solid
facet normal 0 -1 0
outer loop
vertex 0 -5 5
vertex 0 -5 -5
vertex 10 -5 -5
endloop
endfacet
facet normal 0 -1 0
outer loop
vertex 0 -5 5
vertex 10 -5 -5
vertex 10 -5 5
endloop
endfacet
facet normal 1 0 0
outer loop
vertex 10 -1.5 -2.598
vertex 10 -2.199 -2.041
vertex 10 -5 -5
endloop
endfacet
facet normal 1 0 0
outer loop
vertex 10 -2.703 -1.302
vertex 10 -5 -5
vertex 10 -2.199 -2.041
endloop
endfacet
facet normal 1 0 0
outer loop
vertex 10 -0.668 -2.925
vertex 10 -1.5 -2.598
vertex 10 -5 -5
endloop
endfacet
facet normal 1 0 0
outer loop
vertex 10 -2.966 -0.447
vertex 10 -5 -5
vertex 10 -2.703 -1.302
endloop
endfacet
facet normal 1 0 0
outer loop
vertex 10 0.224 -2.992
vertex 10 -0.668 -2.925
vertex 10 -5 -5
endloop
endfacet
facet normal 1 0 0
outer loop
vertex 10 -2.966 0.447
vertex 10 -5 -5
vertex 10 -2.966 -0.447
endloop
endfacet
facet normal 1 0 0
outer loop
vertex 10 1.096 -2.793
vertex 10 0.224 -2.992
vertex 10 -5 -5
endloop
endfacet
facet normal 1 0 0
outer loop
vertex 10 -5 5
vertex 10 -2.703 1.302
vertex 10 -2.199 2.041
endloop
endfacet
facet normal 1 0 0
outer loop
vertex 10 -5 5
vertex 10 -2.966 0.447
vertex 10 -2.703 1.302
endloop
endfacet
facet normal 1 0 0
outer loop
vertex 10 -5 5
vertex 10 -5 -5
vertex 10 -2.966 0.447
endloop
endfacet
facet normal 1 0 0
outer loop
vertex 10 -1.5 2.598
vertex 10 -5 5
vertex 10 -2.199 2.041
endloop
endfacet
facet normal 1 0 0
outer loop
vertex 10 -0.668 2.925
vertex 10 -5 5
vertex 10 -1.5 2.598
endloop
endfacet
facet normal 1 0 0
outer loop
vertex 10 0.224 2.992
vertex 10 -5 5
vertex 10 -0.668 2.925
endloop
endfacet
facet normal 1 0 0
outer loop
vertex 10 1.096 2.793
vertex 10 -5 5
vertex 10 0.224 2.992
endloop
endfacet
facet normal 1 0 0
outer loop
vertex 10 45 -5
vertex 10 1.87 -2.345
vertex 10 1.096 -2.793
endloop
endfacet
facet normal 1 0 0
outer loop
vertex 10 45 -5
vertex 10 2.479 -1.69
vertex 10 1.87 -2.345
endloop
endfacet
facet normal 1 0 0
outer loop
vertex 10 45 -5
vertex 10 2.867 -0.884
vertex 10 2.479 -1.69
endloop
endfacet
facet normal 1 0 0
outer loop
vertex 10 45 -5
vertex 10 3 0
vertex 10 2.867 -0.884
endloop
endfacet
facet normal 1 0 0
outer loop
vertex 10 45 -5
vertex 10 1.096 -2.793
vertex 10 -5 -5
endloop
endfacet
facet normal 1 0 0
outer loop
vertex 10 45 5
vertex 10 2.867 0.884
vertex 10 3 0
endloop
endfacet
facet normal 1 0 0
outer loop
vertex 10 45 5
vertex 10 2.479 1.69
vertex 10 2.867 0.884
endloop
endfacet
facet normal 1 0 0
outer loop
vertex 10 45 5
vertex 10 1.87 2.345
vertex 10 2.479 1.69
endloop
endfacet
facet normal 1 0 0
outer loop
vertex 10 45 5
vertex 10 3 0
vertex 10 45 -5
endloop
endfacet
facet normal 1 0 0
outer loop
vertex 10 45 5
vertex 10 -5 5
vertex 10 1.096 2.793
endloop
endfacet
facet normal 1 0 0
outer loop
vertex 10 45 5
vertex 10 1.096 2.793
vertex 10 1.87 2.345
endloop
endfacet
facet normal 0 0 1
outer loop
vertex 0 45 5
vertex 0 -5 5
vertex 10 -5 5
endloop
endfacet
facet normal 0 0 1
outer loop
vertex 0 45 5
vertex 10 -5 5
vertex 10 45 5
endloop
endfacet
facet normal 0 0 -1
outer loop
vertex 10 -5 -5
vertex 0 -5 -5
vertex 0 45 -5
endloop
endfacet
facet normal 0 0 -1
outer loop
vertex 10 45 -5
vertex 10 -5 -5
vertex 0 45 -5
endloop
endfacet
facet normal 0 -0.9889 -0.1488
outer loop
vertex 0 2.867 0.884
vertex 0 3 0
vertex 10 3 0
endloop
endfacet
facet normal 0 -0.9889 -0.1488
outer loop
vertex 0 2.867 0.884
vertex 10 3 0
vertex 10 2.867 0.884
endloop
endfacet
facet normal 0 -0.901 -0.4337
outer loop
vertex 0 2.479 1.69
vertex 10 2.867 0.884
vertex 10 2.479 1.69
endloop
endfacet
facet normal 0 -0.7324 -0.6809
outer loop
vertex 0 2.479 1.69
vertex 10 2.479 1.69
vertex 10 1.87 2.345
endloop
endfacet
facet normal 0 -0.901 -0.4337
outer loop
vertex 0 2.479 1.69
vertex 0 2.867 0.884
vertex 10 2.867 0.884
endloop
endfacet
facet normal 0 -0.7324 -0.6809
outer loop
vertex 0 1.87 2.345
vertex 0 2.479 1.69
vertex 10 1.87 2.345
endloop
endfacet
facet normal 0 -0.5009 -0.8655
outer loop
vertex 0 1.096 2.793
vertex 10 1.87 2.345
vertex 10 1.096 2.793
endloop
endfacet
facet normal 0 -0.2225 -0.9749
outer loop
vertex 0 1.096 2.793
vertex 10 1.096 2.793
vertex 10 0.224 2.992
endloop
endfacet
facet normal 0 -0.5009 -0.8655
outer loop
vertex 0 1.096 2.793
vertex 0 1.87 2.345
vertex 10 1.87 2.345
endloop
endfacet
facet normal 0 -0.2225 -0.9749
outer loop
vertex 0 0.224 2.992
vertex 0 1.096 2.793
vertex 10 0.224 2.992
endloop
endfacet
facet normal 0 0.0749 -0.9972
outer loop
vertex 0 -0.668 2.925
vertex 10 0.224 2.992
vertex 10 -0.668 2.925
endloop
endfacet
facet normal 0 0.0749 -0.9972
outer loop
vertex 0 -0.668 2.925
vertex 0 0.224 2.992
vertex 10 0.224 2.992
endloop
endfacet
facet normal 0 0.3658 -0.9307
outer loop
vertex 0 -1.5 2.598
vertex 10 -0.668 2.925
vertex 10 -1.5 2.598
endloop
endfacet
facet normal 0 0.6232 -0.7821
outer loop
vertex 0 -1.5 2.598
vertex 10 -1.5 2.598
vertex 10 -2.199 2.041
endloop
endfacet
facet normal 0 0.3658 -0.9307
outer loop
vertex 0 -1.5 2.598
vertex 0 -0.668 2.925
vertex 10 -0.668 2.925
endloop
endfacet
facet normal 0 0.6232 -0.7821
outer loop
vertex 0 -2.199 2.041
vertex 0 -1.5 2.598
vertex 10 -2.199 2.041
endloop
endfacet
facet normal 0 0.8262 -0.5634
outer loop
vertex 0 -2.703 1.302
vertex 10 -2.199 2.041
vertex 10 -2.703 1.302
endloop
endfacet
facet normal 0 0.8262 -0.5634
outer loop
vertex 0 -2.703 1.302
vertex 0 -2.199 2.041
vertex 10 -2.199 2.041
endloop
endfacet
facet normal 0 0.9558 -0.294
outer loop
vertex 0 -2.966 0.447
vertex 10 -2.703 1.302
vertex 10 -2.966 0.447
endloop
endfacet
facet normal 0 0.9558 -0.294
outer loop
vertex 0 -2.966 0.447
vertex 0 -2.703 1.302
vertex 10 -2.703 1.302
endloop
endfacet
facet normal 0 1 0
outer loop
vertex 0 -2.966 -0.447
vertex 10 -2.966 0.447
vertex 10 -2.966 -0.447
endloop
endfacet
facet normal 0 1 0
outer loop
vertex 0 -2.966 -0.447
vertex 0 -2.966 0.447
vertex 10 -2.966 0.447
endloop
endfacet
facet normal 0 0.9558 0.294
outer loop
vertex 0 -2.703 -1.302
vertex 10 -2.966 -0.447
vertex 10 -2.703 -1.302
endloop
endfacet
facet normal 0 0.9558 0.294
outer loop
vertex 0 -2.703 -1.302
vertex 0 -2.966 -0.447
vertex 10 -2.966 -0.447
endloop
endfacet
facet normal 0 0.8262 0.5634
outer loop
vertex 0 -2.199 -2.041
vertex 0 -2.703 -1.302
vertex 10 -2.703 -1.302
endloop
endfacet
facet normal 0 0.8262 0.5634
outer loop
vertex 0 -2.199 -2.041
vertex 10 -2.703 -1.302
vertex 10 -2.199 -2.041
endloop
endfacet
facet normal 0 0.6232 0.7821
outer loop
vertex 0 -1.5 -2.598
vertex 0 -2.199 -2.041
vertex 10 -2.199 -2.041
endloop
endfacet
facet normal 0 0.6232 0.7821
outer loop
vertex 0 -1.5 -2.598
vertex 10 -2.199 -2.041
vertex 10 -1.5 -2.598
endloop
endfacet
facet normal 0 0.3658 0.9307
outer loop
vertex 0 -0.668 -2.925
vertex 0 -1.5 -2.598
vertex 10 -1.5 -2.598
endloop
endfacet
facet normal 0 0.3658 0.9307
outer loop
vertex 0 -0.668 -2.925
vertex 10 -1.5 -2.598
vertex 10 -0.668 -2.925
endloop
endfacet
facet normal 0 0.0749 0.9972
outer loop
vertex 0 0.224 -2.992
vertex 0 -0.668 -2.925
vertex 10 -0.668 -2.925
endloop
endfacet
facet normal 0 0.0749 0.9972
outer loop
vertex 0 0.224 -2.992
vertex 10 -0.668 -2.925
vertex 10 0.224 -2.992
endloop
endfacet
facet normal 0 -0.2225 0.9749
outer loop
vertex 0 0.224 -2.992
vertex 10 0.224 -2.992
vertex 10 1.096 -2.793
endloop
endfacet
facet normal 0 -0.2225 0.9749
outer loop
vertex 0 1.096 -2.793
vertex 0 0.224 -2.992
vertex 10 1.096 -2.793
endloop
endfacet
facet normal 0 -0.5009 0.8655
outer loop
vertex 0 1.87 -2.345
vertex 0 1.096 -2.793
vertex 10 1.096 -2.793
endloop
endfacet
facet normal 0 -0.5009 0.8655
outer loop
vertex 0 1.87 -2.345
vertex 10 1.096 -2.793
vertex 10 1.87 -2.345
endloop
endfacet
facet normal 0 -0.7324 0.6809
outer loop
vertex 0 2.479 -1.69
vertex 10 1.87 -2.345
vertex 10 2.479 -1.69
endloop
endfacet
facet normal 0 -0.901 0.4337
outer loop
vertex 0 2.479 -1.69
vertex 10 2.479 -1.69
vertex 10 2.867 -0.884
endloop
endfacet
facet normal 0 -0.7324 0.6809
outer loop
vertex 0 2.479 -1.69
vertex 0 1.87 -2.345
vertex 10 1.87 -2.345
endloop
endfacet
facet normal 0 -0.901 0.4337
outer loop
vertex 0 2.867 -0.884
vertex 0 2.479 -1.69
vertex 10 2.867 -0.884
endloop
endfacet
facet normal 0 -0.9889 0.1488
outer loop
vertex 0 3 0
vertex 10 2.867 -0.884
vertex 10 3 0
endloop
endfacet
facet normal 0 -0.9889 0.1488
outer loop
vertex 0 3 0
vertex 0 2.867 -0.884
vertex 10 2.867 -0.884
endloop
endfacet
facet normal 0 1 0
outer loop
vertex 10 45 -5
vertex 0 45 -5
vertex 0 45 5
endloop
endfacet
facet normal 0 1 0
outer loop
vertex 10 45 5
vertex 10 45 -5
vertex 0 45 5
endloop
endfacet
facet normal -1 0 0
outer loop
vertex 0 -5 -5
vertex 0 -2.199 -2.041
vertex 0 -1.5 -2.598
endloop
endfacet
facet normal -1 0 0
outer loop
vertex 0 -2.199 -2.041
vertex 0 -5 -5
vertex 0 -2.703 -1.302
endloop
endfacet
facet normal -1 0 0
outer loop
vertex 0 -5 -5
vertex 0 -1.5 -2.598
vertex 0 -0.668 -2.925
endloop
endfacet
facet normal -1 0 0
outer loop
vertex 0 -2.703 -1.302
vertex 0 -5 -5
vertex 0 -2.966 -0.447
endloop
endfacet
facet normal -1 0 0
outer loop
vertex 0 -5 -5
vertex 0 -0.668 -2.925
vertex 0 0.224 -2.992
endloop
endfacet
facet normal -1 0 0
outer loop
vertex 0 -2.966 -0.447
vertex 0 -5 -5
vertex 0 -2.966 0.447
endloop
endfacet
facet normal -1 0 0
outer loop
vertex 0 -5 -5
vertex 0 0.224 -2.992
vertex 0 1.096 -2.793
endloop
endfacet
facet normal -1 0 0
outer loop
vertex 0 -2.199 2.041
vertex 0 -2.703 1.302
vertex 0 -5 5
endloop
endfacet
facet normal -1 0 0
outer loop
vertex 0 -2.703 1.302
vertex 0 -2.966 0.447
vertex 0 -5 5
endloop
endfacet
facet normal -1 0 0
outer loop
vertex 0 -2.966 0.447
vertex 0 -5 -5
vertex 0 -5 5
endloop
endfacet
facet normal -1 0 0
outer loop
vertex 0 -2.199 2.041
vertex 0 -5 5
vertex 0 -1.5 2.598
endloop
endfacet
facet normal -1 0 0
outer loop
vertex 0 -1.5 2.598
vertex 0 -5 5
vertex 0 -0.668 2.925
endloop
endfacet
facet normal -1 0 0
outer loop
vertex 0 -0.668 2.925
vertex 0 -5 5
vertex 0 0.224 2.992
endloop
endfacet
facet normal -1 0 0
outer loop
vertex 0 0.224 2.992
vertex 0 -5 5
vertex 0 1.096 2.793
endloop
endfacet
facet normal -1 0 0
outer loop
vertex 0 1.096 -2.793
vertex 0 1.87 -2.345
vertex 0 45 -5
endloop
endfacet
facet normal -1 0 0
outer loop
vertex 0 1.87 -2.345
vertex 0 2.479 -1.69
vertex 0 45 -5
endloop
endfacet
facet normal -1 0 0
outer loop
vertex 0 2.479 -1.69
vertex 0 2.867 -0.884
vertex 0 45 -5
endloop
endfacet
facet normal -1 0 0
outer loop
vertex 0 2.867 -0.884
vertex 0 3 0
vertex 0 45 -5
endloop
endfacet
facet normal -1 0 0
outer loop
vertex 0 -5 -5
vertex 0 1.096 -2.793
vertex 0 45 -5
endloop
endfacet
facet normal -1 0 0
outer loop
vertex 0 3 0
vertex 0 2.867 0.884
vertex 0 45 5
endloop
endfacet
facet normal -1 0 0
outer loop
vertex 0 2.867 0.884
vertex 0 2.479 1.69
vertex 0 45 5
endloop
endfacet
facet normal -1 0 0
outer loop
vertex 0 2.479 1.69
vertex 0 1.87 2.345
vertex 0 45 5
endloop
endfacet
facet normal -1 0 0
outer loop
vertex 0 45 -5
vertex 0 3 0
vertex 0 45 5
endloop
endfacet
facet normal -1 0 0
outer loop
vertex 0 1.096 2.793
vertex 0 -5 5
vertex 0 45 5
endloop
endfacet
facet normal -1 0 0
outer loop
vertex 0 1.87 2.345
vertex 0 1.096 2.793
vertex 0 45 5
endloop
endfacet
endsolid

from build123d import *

# Parameters (mm, degrees)
SKETCH_W  = 50
SKETCH_H  = 10
SKETCH_R  = 3
PAD_DEPTH = 10


with BuildPart() as part:
    # Sketch → Pad (new body)
    with BuildSketch(Plane.YZ):
        with Locations((20, 0)):
            Rectangle(SKETCH_W, SKETCH_H)
        Circle(SKETCH_R, mode=Mode.SUBTRACT)
    extrude(amount=PAD_DEPTH)


solid = part.part
